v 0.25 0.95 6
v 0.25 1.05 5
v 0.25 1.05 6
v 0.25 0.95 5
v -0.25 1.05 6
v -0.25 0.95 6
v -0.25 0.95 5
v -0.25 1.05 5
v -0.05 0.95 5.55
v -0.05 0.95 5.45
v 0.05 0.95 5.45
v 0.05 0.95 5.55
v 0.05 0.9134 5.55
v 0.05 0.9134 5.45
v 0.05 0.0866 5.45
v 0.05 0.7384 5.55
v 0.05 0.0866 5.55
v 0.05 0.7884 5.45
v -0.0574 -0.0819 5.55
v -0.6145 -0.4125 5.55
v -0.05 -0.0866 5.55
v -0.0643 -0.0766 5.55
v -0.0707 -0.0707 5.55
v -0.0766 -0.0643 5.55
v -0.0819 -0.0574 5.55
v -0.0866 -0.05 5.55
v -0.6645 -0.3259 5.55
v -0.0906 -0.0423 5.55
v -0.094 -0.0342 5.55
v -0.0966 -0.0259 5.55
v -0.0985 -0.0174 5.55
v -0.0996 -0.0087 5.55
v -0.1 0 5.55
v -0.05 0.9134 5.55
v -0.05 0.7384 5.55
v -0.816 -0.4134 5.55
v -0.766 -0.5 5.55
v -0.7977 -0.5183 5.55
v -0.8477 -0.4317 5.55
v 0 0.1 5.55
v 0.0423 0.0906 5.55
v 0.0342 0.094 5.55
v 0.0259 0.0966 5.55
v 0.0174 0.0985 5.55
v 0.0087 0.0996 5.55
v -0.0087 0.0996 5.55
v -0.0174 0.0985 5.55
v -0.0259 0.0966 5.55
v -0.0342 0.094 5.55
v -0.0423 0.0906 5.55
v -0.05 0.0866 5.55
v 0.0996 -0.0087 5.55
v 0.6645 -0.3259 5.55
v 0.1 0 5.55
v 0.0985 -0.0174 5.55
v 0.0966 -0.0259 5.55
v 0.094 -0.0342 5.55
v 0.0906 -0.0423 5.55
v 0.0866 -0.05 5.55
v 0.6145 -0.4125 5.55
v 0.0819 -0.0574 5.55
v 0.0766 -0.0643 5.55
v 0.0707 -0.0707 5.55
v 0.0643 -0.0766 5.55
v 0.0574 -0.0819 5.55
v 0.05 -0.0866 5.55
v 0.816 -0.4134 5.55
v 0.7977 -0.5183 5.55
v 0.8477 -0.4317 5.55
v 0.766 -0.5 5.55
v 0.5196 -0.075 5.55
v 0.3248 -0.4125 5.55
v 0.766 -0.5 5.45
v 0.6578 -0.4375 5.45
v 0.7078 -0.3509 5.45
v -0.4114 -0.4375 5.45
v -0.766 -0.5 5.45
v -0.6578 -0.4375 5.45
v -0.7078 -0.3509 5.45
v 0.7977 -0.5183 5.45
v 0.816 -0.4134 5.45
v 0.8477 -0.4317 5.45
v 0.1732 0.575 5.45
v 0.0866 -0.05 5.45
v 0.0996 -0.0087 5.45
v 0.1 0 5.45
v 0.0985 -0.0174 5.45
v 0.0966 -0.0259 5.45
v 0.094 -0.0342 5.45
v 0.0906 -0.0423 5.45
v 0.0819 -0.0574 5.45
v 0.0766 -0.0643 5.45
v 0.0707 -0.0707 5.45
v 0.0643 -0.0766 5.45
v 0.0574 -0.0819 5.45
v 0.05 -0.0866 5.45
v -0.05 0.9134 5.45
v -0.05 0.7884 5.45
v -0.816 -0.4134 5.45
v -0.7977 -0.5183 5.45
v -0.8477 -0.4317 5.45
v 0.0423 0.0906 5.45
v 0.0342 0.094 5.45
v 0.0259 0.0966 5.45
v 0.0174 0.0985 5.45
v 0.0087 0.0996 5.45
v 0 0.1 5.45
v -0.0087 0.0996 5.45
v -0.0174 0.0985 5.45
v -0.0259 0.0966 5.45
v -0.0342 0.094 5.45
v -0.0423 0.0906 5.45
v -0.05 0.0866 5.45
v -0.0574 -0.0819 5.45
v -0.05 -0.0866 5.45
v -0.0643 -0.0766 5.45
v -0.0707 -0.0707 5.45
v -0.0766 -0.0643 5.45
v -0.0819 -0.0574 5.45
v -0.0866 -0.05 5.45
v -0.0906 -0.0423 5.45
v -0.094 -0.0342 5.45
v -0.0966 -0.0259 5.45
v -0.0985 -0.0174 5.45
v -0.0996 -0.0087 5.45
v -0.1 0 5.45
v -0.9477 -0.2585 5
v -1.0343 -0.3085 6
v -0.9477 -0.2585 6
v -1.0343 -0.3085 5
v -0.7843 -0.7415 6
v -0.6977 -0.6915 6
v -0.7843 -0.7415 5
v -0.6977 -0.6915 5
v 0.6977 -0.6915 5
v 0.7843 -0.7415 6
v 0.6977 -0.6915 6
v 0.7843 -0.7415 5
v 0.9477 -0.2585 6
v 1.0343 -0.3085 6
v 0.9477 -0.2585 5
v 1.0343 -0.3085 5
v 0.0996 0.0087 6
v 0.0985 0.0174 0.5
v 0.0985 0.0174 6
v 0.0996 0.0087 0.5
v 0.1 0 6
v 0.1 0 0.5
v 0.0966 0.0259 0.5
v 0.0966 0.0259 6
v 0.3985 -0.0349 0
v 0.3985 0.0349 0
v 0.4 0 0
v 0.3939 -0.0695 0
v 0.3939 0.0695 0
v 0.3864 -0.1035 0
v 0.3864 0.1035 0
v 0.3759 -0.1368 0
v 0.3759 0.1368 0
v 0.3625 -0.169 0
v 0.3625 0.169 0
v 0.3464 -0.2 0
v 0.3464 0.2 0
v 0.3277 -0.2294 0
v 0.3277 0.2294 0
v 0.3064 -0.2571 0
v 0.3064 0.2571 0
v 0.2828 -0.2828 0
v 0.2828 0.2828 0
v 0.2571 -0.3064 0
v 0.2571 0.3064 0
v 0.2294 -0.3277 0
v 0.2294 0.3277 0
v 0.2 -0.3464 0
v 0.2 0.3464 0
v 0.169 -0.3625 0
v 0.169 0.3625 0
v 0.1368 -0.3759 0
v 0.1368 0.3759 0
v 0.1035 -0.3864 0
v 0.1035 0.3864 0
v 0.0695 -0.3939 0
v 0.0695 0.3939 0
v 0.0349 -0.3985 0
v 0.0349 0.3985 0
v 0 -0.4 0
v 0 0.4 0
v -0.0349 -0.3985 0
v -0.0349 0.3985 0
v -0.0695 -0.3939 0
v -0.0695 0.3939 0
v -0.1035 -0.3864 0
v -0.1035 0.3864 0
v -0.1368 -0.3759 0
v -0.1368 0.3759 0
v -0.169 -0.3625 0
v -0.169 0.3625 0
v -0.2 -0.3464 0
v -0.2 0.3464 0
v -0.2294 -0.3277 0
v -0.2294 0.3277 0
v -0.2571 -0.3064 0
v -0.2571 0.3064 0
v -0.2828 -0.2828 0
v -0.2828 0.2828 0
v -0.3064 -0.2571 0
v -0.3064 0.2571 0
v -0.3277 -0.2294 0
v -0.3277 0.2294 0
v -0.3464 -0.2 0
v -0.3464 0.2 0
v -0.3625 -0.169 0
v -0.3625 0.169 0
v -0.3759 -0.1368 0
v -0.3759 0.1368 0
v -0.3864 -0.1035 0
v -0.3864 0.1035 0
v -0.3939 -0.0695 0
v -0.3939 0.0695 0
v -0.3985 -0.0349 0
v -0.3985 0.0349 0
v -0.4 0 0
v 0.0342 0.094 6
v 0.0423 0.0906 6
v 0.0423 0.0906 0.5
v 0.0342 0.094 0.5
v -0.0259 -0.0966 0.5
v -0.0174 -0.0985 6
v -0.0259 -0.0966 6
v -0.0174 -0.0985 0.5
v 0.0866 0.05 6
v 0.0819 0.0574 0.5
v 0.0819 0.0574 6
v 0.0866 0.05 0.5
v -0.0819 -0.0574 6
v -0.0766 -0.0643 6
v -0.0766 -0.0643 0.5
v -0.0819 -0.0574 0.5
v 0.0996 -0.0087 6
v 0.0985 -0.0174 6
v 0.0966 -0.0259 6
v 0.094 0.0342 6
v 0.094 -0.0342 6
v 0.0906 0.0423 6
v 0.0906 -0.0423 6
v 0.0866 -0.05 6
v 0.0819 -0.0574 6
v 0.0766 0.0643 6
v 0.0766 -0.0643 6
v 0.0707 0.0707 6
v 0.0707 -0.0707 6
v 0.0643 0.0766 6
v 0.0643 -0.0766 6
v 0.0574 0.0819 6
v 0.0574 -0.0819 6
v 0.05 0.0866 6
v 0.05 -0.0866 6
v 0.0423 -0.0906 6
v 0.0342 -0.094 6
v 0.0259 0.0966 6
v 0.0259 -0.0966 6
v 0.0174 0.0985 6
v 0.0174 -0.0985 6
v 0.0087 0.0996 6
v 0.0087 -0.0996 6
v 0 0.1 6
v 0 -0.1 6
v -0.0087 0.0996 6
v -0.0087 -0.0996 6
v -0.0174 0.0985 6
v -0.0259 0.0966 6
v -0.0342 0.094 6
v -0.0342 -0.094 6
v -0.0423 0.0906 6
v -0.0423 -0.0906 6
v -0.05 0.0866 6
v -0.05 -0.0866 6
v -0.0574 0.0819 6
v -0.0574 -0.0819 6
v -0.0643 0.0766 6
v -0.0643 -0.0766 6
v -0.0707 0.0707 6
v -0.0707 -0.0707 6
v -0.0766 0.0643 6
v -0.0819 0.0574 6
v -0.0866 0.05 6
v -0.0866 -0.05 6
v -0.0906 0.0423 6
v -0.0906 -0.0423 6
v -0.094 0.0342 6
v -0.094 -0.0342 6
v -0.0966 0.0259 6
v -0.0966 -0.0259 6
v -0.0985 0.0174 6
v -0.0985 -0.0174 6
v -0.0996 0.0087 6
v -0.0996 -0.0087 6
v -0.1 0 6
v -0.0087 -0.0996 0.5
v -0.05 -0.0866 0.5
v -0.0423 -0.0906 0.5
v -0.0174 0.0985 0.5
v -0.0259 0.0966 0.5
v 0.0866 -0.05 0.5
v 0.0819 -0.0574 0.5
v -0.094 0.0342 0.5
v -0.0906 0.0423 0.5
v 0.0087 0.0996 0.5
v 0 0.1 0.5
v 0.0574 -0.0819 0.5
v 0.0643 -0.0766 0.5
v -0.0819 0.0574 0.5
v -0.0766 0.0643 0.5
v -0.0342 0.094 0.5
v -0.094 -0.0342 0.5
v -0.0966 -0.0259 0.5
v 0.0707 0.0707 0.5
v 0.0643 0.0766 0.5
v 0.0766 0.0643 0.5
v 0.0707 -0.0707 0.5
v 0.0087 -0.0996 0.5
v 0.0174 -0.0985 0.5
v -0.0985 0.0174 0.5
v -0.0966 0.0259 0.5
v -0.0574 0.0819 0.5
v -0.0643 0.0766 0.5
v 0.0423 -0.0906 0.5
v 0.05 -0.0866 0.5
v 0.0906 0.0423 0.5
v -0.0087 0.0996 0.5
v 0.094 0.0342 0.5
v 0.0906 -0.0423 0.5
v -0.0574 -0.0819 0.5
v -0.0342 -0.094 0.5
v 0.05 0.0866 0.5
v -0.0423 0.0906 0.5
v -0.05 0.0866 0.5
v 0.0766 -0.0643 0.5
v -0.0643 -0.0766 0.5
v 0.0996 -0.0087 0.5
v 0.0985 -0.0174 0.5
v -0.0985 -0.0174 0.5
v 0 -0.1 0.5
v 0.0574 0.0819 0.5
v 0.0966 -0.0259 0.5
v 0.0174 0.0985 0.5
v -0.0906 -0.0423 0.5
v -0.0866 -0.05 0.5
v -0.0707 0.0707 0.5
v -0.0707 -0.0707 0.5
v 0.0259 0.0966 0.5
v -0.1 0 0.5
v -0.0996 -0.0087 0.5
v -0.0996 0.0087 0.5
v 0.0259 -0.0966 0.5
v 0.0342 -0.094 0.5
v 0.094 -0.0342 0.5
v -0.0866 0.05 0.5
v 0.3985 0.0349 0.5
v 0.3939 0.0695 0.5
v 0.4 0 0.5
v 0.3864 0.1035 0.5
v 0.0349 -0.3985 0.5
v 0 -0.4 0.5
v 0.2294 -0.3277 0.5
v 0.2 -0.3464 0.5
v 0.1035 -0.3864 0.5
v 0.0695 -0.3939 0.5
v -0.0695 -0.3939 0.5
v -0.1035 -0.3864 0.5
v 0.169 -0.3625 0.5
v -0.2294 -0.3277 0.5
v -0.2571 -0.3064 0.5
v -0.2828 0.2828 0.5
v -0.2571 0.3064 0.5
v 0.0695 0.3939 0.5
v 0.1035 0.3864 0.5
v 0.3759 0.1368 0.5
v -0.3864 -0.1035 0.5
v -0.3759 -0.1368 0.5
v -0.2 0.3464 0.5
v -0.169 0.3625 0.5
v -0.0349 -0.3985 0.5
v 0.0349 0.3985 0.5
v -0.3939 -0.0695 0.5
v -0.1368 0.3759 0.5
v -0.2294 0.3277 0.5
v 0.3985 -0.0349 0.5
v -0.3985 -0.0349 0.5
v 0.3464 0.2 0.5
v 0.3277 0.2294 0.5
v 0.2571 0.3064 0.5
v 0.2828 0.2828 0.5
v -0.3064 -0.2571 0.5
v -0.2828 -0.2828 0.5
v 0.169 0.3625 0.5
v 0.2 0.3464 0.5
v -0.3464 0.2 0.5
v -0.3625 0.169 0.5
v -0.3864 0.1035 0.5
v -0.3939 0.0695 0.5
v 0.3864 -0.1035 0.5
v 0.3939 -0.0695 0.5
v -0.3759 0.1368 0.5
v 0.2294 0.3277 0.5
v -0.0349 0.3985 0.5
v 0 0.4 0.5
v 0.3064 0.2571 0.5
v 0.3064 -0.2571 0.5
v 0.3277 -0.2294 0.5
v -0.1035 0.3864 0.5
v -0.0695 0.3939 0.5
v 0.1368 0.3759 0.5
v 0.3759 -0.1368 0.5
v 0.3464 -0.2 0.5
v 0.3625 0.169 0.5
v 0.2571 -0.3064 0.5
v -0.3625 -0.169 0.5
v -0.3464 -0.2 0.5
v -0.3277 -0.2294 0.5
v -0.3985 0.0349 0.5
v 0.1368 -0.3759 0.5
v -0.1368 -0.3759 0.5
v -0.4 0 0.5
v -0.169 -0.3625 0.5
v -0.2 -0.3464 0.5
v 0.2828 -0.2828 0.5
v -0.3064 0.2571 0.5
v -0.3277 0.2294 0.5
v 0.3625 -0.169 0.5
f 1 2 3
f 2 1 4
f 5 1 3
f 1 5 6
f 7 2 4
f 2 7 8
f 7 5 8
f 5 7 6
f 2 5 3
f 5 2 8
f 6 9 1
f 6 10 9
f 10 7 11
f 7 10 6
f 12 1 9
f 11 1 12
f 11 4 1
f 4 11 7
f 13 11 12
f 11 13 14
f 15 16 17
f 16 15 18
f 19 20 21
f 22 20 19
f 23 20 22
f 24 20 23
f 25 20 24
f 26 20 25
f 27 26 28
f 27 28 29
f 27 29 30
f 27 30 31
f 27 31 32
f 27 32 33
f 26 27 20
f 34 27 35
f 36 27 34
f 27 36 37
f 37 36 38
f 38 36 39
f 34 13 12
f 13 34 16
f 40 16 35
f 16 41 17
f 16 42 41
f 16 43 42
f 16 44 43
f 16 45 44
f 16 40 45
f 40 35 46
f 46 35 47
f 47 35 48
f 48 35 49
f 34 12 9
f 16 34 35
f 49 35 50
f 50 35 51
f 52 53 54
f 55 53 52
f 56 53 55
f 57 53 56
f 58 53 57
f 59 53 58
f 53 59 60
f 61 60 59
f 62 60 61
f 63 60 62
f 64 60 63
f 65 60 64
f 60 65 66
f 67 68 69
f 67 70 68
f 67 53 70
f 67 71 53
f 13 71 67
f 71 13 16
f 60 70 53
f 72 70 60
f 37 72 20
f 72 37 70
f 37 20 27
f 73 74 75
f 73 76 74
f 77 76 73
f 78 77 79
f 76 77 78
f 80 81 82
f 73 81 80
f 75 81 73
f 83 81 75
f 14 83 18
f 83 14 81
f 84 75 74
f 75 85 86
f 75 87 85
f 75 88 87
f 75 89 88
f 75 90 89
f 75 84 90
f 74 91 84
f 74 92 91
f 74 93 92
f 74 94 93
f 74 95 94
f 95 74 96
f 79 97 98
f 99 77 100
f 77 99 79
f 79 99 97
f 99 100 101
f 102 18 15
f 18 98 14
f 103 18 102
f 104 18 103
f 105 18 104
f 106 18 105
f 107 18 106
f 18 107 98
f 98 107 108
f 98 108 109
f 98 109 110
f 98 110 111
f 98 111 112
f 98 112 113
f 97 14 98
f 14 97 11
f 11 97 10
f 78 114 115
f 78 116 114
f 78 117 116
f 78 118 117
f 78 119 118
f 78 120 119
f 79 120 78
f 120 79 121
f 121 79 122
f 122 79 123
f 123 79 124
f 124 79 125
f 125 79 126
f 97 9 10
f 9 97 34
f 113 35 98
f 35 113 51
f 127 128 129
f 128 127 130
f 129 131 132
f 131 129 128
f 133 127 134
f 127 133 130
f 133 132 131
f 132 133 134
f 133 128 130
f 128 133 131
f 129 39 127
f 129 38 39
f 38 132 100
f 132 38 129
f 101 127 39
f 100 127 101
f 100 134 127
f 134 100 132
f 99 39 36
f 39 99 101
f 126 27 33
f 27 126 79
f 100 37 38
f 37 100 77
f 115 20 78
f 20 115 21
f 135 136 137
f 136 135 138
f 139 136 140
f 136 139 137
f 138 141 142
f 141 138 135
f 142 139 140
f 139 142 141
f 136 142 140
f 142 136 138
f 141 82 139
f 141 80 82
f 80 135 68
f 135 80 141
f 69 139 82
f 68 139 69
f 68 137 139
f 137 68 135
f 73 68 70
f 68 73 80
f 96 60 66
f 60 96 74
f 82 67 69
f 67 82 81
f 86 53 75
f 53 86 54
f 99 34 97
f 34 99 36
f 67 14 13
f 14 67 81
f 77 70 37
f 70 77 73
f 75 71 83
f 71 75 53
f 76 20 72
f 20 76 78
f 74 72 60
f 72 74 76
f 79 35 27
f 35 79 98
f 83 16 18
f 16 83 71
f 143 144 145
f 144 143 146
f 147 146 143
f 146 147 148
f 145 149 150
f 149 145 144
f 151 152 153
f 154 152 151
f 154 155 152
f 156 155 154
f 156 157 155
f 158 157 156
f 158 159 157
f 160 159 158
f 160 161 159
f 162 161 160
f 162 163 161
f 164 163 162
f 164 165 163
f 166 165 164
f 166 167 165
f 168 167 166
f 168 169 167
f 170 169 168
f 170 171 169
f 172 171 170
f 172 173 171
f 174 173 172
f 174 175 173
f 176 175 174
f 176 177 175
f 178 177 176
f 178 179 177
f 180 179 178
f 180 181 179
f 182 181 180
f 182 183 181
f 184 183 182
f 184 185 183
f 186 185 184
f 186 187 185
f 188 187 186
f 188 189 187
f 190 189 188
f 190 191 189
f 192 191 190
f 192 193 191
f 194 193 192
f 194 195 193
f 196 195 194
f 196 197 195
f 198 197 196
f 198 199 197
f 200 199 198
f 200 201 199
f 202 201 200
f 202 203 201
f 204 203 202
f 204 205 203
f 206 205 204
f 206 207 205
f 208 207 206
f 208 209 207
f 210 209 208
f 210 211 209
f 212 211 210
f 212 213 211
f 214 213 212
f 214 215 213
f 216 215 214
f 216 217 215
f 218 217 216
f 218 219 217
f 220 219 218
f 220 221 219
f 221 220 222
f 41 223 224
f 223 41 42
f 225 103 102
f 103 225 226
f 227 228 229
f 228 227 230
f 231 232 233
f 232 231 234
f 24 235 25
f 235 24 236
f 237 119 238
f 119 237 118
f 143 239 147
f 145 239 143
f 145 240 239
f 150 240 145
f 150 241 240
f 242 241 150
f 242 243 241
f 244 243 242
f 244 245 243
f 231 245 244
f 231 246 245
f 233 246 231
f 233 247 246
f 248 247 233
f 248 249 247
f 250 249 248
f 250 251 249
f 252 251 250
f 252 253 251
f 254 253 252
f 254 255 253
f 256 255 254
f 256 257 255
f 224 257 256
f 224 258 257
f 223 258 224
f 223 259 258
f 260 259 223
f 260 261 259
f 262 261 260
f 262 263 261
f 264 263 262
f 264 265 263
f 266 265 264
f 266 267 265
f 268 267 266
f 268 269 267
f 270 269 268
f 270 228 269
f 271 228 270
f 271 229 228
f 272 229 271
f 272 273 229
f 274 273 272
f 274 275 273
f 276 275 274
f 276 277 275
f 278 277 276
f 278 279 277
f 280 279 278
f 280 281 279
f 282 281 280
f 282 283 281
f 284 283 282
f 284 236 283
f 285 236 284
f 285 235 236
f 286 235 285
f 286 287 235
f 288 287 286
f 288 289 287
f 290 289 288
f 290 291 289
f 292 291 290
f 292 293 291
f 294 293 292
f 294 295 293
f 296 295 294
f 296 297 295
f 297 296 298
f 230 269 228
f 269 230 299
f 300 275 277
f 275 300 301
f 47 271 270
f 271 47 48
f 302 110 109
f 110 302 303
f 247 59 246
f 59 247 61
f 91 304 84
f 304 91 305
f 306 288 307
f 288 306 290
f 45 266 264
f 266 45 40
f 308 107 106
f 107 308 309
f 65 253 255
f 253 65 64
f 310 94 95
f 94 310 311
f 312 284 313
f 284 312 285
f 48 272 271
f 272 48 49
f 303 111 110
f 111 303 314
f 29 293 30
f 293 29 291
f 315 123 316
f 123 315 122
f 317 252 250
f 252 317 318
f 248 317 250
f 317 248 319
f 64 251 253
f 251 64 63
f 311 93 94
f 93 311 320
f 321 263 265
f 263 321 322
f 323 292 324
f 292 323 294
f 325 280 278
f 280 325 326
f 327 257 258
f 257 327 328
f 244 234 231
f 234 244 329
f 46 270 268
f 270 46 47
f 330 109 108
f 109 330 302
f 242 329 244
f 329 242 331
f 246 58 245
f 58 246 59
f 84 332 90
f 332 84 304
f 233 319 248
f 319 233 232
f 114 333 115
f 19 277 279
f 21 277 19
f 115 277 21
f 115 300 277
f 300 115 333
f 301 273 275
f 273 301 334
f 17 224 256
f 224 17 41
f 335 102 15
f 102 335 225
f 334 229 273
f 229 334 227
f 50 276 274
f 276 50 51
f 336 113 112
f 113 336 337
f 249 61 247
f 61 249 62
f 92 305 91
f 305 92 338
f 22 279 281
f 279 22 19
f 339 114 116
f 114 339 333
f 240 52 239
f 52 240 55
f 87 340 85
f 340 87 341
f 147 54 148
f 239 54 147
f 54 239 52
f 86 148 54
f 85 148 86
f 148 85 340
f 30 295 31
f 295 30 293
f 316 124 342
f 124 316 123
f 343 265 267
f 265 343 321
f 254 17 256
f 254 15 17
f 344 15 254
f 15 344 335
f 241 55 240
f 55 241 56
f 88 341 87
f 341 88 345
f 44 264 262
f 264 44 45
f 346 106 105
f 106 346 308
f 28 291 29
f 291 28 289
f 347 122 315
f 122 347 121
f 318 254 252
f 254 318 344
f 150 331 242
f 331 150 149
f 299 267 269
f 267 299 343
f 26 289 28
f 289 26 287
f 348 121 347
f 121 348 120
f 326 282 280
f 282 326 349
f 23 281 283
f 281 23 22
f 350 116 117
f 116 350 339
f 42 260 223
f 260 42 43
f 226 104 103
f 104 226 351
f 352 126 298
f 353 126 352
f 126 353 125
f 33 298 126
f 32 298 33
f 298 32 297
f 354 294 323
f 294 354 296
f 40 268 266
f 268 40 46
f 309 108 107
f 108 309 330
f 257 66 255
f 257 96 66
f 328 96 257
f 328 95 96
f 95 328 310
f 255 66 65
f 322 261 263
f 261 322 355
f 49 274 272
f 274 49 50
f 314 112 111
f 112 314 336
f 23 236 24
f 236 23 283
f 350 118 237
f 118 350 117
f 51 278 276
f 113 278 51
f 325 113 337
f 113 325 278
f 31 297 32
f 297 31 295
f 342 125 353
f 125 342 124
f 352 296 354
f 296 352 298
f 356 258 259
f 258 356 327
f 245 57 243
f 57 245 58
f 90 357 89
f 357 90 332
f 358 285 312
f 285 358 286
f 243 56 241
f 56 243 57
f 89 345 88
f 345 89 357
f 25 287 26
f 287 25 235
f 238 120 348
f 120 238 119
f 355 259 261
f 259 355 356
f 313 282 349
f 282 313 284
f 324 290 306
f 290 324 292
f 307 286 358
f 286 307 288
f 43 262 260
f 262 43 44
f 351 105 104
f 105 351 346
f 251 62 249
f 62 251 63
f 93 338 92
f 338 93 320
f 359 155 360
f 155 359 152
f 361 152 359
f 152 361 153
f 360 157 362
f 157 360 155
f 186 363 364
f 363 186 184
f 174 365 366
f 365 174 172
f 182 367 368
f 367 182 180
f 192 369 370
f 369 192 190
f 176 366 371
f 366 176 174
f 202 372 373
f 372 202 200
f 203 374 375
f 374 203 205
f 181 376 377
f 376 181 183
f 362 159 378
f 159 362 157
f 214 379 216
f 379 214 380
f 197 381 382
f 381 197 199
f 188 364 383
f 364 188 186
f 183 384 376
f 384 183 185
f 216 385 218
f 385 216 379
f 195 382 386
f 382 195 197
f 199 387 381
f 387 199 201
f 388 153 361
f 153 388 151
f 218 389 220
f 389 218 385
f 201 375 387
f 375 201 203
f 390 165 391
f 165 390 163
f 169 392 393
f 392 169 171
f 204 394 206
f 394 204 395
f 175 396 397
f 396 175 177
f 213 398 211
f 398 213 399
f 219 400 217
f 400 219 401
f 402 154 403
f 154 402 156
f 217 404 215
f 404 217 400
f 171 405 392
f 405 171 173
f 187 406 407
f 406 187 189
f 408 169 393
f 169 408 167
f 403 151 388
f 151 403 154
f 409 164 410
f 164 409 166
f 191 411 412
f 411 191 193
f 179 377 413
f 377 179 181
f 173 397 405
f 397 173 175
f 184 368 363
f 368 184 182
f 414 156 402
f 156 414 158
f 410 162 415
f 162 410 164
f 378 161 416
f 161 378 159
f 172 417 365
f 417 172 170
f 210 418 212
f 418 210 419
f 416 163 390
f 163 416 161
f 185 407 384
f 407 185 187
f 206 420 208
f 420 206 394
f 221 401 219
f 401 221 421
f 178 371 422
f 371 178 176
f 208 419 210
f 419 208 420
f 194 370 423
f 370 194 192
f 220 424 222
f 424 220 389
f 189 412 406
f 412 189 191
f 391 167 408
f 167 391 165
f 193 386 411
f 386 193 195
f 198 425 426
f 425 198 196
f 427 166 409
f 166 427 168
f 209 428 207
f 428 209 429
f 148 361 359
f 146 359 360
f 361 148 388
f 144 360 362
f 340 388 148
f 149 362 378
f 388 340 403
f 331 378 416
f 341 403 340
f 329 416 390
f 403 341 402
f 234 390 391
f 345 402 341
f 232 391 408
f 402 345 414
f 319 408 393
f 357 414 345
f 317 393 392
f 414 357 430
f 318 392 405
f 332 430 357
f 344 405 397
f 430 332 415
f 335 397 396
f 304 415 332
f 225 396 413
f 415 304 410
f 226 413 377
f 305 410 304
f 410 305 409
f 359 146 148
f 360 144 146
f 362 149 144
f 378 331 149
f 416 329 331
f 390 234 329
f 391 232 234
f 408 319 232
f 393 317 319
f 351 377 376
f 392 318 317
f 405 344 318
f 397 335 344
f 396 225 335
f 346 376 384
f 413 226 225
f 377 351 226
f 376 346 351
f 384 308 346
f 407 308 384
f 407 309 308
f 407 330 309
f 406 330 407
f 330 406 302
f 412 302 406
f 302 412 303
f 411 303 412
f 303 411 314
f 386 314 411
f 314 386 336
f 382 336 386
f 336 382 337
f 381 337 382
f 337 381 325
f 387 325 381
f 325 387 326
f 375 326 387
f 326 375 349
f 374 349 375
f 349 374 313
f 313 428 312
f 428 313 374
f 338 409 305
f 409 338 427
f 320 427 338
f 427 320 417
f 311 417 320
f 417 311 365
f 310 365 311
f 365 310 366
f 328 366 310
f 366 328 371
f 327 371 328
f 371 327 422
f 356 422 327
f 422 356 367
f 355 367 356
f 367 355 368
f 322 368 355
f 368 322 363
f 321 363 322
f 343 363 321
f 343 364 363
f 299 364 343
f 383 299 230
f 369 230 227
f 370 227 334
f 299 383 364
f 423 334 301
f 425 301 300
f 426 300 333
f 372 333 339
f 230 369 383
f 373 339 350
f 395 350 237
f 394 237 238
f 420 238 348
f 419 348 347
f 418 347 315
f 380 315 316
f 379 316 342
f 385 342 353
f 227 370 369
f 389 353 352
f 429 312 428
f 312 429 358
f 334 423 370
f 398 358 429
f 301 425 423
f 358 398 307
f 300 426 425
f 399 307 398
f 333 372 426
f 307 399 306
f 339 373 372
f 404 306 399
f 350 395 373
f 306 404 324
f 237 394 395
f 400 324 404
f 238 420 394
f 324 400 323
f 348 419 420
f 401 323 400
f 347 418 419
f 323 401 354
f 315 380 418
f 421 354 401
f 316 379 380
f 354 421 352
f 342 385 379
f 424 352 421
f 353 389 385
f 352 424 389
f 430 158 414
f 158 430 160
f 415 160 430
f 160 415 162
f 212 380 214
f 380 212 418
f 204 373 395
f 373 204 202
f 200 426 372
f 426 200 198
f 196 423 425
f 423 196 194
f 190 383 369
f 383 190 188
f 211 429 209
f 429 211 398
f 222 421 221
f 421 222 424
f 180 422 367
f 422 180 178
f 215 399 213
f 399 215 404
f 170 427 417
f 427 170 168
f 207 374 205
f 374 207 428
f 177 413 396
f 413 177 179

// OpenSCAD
use <lib.scad>

module repeater() {
	union() {
		translate([0,0,3]) cyl(0.1, 0.1, 6);

		for (i = [0:1:2])
			rotate([0,0,i*120]) translate([0,1,5.5]) union() {
				box([0.5,0.1,1.0]);
				translate([0,-0.5,0]) box([0.1,1,0.1]);
			}

		rotate([0,0,-30]) translate([0,0,5.5]) difference() {
			cyl(1,1,0.1,$fn=3);
			cyl(0.9,0.8,0.2,$fn=3);
		}

		translate([0,0,0.25]) cyl(0.4,0.4,0.5);
	}
}

repeater($fn=72);
